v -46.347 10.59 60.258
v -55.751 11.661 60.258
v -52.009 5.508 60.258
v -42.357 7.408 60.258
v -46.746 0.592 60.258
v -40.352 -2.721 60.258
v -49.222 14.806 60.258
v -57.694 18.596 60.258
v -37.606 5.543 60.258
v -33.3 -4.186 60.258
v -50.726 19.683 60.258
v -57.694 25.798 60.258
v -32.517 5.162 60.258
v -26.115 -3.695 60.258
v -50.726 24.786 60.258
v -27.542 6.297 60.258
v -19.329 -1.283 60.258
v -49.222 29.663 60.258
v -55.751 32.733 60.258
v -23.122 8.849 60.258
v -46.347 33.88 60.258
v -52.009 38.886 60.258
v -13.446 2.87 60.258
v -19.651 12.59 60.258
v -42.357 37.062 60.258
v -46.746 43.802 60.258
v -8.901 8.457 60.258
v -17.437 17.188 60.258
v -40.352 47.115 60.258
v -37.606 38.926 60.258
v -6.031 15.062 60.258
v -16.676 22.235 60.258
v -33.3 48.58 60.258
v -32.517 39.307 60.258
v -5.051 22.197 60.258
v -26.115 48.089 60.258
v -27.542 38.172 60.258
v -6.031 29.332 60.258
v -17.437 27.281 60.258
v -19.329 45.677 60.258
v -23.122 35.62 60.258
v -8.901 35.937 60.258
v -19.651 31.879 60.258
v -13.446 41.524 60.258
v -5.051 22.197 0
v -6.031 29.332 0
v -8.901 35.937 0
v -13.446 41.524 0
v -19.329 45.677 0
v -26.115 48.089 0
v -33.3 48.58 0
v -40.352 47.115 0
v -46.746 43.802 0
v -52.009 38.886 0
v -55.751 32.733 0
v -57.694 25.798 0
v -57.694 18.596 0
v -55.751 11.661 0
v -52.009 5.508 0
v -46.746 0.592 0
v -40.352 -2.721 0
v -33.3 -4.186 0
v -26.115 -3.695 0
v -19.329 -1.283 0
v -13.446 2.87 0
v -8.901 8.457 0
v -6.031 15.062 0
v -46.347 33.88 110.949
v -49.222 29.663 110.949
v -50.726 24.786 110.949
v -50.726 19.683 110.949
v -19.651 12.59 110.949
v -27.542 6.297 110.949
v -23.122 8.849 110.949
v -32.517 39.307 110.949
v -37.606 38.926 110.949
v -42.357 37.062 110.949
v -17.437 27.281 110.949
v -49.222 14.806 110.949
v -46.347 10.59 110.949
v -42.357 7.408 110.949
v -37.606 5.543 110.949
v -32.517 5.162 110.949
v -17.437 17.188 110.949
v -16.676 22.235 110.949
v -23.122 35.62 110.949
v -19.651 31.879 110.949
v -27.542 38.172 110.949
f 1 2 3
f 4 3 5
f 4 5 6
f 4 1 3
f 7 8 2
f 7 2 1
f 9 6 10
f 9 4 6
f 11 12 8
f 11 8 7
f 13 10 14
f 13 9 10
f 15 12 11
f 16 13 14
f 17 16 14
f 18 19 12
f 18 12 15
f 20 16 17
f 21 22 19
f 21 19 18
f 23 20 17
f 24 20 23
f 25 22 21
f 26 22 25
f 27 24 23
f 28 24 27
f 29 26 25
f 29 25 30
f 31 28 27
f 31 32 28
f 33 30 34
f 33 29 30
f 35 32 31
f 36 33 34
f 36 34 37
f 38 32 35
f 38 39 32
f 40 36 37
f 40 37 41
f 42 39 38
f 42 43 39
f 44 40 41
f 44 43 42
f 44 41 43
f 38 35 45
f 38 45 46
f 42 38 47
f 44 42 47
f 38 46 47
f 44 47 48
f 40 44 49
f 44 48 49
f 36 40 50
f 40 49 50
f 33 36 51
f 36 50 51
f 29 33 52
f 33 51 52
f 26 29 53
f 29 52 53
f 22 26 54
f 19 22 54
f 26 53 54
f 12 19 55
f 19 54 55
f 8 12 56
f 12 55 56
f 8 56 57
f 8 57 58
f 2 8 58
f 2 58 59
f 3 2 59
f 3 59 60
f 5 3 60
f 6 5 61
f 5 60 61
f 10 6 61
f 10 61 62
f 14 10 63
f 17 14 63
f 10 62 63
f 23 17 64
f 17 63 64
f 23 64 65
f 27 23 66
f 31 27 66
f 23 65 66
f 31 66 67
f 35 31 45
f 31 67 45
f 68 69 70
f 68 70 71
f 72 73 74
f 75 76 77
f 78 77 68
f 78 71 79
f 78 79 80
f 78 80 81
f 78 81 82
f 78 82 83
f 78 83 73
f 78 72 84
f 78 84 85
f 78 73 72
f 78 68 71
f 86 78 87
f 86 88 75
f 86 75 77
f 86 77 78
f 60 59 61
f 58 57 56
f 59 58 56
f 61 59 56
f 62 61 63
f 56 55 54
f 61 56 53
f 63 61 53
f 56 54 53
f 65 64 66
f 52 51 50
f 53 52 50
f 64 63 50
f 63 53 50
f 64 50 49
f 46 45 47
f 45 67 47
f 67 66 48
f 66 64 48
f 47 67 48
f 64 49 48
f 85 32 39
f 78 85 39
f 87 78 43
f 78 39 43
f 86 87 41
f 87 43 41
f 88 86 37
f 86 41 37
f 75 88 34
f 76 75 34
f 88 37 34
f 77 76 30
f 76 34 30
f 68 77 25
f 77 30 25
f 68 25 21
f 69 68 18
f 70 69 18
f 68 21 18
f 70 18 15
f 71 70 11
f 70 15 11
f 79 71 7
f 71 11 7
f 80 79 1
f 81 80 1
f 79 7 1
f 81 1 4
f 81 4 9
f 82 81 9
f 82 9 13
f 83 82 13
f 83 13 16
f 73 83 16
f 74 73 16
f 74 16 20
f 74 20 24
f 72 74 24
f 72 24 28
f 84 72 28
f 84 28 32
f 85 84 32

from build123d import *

# Parameters (mm, degrees)
F0_R      = 26.44498
F1_DEPTH  = 5.181627
F1_FACE_R = 26.44498
F2_DEPTH  = 55.07613
F3_R      = 17.120635
F4_DEPTH  = 110.949099


with BuildPart() as f1:
    # F0 (on Top) → F1 (new body)
    with BuildSketch(Plane.XY):
        with Locations((-31.49575, 22.197023)):
            Circle(F0_R)
    extrude(amount=F1_DEPTH)

    # F1_face (on face) → F2 (join)
    with BuildSketch(Plane(origin=(-31.49575, 22.197023, 5.181627), x_dir=(1, 0, 0), z_dir=(0, 0, 1))):
        Circle(F1_FACE_R)
    extrude(amount=F2_DEPTH)

    # F3 (on Top) → F4 (join)
    with BuildSketch(Plane.XY):
        with Locations((-33.796612, 22.234606)):
            Circle(F3_R)
    extrude(amount=F4_DEPTH)


solid = f1.part
